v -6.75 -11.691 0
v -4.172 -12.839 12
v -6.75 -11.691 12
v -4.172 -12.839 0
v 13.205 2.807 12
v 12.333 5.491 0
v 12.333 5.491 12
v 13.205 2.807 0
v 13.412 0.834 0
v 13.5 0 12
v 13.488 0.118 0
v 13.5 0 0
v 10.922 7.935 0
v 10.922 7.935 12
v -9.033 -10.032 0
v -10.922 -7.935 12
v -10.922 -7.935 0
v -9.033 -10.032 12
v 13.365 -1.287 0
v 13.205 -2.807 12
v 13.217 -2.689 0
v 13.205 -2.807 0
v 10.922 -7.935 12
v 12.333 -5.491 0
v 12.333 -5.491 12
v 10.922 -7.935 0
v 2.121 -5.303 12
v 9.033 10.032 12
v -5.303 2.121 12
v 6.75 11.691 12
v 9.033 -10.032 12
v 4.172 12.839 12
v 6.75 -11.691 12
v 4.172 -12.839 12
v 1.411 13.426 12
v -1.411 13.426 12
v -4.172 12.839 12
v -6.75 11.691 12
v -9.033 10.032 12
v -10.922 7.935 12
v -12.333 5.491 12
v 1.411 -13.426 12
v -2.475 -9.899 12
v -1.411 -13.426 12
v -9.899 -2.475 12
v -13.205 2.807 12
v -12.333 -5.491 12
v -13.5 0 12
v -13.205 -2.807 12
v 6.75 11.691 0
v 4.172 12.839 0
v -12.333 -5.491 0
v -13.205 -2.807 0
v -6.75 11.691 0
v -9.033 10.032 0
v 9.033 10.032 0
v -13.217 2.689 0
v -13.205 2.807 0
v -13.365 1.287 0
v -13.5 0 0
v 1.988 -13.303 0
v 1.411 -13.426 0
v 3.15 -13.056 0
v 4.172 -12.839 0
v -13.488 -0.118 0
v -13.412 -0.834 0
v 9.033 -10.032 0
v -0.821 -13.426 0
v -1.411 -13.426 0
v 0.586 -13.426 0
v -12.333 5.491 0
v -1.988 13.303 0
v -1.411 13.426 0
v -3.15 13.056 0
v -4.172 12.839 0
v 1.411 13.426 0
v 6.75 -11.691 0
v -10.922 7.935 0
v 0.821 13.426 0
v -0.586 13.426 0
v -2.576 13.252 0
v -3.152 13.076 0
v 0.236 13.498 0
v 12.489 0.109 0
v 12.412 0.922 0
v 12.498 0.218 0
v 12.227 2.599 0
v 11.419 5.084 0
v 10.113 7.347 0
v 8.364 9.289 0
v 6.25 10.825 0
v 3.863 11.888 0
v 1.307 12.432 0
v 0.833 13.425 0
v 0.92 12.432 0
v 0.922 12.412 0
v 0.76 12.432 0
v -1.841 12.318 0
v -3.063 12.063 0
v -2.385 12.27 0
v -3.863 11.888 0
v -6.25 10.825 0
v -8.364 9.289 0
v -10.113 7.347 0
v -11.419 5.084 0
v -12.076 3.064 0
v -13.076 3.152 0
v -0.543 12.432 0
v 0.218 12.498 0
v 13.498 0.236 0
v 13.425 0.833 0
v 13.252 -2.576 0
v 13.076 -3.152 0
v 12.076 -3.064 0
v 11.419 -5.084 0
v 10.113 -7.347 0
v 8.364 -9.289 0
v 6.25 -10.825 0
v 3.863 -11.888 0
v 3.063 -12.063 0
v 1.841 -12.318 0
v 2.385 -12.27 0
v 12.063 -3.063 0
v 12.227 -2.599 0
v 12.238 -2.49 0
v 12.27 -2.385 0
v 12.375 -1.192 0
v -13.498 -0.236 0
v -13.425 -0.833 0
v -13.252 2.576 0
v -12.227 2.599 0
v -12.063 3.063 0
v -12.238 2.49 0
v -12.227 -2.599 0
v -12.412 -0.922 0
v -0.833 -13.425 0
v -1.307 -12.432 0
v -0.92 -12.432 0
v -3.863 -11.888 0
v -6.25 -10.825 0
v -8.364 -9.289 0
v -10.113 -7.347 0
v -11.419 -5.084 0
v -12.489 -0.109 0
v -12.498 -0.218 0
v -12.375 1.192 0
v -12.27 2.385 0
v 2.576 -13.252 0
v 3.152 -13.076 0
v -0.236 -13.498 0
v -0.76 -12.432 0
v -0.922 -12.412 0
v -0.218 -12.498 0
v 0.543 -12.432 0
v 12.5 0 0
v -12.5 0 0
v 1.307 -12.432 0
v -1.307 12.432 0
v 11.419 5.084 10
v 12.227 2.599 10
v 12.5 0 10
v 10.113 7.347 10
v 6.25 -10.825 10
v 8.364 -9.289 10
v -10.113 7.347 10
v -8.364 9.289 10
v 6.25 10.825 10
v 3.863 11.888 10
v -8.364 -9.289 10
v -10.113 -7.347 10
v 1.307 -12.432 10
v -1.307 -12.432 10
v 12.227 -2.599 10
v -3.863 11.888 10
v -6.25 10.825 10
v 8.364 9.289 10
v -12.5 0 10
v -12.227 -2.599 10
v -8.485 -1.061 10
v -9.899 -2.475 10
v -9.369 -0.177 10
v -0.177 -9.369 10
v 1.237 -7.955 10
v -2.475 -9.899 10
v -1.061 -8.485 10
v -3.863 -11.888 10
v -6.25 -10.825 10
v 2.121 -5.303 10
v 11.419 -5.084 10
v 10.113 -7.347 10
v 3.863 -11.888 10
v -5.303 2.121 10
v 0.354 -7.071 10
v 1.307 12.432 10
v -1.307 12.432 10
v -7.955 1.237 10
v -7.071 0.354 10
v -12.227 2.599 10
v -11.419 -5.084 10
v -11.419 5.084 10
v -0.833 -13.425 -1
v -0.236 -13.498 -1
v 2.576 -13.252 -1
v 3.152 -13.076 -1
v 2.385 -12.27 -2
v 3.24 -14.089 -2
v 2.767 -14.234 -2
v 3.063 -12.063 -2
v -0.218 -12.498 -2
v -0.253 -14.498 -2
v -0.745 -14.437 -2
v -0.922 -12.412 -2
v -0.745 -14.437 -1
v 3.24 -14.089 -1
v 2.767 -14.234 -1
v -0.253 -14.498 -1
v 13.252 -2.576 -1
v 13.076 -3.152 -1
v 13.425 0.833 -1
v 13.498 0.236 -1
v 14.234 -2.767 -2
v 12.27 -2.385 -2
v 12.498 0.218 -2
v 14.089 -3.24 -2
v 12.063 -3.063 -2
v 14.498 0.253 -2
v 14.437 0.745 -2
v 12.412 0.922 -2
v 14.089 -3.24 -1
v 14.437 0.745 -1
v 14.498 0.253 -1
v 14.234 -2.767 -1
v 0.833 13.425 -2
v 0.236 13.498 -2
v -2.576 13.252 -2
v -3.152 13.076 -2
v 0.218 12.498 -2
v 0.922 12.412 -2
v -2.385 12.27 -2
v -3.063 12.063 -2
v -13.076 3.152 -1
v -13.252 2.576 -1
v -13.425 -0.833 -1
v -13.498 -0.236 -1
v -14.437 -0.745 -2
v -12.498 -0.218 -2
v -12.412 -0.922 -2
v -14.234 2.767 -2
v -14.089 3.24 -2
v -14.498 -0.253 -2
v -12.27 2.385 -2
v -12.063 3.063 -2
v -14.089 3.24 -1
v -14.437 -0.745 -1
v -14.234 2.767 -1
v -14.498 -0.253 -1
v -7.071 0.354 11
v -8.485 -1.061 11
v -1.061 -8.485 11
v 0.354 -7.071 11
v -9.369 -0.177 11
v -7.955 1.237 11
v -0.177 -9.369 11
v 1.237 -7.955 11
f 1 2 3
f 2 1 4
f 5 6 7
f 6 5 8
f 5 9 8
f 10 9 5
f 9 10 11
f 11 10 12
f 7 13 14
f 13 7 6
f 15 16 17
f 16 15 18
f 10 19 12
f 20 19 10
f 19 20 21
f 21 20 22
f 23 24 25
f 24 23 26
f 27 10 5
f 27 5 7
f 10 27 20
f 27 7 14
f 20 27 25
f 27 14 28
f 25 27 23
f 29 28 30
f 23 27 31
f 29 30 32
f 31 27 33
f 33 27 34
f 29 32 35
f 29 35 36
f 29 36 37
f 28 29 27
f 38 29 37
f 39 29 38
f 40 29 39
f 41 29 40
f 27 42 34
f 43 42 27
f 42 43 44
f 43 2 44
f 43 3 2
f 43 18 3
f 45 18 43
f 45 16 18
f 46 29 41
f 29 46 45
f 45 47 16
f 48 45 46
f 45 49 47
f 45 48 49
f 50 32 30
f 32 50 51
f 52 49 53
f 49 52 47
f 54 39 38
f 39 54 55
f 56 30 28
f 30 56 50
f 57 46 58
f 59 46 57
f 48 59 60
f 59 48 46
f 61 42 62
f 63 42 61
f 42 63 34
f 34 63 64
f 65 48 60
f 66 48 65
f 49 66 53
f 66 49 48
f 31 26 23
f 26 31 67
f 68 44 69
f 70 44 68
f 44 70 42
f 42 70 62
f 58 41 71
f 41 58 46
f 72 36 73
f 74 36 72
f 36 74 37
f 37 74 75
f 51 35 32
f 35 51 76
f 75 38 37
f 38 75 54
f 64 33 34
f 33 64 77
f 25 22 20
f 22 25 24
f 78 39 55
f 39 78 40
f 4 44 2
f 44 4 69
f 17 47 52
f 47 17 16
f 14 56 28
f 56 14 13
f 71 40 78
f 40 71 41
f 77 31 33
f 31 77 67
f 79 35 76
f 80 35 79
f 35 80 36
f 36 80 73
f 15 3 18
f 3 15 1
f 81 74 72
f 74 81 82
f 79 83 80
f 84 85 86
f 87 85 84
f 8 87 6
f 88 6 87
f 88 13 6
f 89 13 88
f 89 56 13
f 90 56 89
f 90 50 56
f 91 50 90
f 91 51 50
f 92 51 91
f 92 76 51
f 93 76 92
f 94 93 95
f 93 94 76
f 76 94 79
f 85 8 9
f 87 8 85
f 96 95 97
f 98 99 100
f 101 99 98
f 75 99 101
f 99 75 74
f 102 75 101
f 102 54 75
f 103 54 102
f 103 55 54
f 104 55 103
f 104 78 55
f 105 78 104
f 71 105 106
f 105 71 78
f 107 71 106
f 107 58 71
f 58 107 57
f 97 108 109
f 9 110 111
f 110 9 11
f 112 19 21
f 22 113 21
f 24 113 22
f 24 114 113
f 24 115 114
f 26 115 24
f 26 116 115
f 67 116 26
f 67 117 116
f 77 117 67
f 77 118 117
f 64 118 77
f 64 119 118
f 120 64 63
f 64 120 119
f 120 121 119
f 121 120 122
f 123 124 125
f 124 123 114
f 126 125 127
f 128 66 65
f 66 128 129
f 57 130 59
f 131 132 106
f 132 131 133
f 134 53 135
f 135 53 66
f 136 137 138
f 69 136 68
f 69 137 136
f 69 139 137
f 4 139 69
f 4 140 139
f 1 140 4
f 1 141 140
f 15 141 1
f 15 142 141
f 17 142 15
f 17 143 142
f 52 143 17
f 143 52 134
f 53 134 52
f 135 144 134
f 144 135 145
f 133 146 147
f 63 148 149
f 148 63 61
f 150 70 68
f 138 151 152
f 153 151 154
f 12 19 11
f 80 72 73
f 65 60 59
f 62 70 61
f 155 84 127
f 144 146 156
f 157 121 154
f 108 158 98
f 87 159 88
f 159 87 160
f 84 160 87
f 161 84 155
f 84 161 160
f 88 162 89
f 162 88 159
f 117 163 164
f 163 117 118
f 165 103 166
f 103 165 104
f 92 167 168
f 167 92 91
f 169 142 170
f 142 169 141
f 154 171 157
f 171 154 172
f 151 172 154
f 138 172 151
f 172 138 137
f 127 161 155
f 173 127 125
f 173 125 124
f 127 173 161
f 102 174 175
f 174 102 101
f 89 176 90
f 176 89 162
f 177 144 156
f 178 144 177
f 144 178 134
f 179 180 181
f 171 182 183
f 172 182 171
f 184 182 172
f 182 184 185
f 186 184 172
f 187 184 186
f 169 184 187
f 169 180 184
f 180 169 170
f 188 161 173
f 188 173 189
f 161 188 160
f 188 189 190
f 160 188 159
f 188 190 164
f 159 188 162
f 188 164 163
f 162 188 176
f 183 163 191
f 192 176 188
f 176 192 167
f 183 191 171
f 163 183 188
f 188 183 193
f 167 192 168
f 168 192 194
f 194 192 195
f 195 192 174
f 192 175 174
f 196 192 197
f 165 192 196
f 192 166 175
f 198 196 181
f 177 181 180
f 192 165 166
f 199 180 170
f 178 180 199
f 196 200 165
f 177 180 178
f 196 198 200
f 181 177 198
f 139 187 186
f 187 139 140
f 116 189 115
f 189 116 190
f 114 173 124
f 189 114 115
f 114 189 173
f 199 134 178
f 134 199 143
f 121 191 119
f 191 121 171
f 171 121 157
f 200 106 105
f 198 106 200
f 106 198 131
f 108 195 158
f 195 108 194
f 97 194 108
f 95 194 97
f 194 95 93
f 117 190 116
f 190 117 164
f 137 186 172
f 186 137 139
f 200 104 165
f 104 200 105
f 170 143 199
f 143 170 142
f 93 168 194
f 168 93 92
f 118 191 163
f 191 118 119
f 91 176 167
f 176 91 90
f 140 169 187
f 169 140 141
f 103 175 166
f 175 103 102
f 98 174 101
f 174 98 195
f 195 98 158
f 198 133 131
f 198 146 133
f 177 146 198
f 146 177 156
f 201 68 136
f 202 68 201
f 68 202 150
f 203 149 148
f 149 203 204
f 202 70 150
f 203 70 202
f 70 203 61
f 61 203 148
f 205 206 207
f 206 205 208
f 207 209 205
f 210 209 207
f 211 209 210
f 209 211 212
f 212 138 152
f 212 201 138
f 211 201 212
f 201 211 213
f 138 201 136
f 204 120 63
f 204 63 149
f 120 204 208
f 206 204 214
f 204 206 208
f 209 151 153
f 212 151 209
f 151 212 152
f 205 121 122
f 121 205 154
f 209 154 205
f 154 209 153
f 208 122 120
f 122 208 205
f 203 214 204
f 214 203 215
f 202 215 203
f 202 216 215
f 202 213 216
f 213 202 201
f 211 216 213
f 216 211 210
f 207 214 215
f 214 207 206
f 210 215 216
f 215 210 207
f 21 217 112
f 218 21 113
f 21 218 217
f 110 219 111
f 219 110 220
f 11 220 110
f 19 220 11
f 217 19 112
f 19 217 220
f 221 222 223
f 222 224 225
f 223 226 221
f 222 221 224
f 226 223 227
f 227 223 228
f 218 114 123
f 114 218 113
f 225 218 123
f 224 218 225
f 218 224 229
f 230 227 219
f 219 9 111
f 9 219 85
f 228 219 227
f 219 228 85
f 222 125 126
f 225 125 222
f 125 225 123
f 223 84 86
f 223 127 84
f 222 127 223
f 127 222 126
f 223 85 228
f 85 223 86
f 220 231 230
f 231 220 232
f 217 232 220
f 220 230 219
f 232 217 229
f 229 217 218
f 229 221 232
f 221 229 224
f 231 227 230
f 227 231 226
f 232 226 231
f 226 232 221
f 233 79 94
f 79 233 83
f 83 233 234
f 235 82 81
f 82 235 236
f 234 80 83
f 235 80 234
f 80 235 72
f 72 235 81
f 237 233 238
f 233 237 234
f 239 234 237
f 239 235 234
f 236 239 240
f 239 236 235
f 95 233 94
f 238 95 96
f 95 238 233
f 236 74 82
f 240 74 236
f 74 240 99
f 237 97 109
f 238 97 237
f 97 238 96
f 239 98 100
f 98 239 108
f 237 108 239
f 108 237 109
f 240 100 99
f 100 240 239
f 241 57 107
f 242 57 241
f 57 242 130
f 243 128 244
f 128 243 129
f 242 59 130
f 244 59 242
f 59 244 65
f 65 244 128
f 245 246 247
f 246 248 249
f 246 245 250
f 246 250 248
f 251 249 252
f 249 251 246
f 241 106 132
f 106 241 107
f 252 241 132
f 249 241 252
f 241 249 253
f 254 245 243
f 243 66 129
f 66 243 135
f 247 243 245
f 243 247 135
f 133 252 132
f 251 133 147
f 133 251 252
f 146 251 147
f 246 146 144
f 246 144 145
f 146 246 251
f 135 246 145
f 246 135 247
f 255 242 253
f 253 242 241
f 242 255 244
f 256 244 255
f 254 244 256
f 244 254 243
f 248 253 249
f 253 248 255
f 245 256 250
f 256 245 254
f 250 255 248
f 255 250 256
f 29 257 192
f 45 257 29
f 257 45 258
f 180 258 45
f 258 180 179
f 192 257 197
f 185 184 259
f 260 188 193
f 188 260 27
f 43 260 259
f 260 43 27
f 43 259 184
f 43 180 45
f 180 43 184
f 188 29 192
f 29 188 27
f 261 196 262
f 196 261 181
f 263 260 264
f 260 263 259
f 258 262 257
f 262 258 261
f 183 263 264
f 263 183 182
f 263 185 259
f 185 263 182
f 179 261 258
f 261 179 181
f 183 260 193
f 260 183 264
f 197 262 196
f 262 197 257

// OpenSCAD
module pin(has_nop = true){
        translate([0,0,-2]){
        difference(){
            cylinder(2,27/2,27/2);
            translate([2,2,-6])
                cube([40-0,40,10]);            
            translate([-2-40,2,-6])
                cube([45,40,10]);            
            translate([-2-40,-2-40,-6])
                cube([40,45,10]);            
            translate([2,-2-40,-6])
                cube([40,45,10]);            

            translate([0,0,-1])
                cylinder(5,27/2-1,27/2-1);            
        }
        if (has_nop){
            translate([0,0,0])
            difference(){
                cylinder(1,27/2+1,27/2+1);
                translate([0,2,-6])
                    cube([40,40,10]);
                translate([-40,2,-6])
                    cube([45,40,10]);
                translate([-2-40,-2-40,-6])
                    cube([40,45,10]);
                translate([2,-2-40,-6])
                    cube([40,45,10]);        
                translate([0,0,-1])
                    cylinder(5,26/2,26/2);
            }
        }
    }
}

module cone(){
    difference(){
        cylinder(12,27/2,27/2);
        cylinder(10,27/2-1,27/2-1);
    }
    rotate([0,0,90*0+5])
        pin(true);
    rotate([0,0,90*1-5])
        pin(true);
    rotate([0,0,90*2+5])
        pin(false);
    rotate([0,0,90*3-5])
        pin(true);    
}



difference(){
    cone();
    rotate(45+90){
        translate([-5.25,2.25,8]){
            cube([10.5,6.5,8]);
            translate([-1.25,2.5,0])
            cube([13,2,3]);
        }
    }
}
